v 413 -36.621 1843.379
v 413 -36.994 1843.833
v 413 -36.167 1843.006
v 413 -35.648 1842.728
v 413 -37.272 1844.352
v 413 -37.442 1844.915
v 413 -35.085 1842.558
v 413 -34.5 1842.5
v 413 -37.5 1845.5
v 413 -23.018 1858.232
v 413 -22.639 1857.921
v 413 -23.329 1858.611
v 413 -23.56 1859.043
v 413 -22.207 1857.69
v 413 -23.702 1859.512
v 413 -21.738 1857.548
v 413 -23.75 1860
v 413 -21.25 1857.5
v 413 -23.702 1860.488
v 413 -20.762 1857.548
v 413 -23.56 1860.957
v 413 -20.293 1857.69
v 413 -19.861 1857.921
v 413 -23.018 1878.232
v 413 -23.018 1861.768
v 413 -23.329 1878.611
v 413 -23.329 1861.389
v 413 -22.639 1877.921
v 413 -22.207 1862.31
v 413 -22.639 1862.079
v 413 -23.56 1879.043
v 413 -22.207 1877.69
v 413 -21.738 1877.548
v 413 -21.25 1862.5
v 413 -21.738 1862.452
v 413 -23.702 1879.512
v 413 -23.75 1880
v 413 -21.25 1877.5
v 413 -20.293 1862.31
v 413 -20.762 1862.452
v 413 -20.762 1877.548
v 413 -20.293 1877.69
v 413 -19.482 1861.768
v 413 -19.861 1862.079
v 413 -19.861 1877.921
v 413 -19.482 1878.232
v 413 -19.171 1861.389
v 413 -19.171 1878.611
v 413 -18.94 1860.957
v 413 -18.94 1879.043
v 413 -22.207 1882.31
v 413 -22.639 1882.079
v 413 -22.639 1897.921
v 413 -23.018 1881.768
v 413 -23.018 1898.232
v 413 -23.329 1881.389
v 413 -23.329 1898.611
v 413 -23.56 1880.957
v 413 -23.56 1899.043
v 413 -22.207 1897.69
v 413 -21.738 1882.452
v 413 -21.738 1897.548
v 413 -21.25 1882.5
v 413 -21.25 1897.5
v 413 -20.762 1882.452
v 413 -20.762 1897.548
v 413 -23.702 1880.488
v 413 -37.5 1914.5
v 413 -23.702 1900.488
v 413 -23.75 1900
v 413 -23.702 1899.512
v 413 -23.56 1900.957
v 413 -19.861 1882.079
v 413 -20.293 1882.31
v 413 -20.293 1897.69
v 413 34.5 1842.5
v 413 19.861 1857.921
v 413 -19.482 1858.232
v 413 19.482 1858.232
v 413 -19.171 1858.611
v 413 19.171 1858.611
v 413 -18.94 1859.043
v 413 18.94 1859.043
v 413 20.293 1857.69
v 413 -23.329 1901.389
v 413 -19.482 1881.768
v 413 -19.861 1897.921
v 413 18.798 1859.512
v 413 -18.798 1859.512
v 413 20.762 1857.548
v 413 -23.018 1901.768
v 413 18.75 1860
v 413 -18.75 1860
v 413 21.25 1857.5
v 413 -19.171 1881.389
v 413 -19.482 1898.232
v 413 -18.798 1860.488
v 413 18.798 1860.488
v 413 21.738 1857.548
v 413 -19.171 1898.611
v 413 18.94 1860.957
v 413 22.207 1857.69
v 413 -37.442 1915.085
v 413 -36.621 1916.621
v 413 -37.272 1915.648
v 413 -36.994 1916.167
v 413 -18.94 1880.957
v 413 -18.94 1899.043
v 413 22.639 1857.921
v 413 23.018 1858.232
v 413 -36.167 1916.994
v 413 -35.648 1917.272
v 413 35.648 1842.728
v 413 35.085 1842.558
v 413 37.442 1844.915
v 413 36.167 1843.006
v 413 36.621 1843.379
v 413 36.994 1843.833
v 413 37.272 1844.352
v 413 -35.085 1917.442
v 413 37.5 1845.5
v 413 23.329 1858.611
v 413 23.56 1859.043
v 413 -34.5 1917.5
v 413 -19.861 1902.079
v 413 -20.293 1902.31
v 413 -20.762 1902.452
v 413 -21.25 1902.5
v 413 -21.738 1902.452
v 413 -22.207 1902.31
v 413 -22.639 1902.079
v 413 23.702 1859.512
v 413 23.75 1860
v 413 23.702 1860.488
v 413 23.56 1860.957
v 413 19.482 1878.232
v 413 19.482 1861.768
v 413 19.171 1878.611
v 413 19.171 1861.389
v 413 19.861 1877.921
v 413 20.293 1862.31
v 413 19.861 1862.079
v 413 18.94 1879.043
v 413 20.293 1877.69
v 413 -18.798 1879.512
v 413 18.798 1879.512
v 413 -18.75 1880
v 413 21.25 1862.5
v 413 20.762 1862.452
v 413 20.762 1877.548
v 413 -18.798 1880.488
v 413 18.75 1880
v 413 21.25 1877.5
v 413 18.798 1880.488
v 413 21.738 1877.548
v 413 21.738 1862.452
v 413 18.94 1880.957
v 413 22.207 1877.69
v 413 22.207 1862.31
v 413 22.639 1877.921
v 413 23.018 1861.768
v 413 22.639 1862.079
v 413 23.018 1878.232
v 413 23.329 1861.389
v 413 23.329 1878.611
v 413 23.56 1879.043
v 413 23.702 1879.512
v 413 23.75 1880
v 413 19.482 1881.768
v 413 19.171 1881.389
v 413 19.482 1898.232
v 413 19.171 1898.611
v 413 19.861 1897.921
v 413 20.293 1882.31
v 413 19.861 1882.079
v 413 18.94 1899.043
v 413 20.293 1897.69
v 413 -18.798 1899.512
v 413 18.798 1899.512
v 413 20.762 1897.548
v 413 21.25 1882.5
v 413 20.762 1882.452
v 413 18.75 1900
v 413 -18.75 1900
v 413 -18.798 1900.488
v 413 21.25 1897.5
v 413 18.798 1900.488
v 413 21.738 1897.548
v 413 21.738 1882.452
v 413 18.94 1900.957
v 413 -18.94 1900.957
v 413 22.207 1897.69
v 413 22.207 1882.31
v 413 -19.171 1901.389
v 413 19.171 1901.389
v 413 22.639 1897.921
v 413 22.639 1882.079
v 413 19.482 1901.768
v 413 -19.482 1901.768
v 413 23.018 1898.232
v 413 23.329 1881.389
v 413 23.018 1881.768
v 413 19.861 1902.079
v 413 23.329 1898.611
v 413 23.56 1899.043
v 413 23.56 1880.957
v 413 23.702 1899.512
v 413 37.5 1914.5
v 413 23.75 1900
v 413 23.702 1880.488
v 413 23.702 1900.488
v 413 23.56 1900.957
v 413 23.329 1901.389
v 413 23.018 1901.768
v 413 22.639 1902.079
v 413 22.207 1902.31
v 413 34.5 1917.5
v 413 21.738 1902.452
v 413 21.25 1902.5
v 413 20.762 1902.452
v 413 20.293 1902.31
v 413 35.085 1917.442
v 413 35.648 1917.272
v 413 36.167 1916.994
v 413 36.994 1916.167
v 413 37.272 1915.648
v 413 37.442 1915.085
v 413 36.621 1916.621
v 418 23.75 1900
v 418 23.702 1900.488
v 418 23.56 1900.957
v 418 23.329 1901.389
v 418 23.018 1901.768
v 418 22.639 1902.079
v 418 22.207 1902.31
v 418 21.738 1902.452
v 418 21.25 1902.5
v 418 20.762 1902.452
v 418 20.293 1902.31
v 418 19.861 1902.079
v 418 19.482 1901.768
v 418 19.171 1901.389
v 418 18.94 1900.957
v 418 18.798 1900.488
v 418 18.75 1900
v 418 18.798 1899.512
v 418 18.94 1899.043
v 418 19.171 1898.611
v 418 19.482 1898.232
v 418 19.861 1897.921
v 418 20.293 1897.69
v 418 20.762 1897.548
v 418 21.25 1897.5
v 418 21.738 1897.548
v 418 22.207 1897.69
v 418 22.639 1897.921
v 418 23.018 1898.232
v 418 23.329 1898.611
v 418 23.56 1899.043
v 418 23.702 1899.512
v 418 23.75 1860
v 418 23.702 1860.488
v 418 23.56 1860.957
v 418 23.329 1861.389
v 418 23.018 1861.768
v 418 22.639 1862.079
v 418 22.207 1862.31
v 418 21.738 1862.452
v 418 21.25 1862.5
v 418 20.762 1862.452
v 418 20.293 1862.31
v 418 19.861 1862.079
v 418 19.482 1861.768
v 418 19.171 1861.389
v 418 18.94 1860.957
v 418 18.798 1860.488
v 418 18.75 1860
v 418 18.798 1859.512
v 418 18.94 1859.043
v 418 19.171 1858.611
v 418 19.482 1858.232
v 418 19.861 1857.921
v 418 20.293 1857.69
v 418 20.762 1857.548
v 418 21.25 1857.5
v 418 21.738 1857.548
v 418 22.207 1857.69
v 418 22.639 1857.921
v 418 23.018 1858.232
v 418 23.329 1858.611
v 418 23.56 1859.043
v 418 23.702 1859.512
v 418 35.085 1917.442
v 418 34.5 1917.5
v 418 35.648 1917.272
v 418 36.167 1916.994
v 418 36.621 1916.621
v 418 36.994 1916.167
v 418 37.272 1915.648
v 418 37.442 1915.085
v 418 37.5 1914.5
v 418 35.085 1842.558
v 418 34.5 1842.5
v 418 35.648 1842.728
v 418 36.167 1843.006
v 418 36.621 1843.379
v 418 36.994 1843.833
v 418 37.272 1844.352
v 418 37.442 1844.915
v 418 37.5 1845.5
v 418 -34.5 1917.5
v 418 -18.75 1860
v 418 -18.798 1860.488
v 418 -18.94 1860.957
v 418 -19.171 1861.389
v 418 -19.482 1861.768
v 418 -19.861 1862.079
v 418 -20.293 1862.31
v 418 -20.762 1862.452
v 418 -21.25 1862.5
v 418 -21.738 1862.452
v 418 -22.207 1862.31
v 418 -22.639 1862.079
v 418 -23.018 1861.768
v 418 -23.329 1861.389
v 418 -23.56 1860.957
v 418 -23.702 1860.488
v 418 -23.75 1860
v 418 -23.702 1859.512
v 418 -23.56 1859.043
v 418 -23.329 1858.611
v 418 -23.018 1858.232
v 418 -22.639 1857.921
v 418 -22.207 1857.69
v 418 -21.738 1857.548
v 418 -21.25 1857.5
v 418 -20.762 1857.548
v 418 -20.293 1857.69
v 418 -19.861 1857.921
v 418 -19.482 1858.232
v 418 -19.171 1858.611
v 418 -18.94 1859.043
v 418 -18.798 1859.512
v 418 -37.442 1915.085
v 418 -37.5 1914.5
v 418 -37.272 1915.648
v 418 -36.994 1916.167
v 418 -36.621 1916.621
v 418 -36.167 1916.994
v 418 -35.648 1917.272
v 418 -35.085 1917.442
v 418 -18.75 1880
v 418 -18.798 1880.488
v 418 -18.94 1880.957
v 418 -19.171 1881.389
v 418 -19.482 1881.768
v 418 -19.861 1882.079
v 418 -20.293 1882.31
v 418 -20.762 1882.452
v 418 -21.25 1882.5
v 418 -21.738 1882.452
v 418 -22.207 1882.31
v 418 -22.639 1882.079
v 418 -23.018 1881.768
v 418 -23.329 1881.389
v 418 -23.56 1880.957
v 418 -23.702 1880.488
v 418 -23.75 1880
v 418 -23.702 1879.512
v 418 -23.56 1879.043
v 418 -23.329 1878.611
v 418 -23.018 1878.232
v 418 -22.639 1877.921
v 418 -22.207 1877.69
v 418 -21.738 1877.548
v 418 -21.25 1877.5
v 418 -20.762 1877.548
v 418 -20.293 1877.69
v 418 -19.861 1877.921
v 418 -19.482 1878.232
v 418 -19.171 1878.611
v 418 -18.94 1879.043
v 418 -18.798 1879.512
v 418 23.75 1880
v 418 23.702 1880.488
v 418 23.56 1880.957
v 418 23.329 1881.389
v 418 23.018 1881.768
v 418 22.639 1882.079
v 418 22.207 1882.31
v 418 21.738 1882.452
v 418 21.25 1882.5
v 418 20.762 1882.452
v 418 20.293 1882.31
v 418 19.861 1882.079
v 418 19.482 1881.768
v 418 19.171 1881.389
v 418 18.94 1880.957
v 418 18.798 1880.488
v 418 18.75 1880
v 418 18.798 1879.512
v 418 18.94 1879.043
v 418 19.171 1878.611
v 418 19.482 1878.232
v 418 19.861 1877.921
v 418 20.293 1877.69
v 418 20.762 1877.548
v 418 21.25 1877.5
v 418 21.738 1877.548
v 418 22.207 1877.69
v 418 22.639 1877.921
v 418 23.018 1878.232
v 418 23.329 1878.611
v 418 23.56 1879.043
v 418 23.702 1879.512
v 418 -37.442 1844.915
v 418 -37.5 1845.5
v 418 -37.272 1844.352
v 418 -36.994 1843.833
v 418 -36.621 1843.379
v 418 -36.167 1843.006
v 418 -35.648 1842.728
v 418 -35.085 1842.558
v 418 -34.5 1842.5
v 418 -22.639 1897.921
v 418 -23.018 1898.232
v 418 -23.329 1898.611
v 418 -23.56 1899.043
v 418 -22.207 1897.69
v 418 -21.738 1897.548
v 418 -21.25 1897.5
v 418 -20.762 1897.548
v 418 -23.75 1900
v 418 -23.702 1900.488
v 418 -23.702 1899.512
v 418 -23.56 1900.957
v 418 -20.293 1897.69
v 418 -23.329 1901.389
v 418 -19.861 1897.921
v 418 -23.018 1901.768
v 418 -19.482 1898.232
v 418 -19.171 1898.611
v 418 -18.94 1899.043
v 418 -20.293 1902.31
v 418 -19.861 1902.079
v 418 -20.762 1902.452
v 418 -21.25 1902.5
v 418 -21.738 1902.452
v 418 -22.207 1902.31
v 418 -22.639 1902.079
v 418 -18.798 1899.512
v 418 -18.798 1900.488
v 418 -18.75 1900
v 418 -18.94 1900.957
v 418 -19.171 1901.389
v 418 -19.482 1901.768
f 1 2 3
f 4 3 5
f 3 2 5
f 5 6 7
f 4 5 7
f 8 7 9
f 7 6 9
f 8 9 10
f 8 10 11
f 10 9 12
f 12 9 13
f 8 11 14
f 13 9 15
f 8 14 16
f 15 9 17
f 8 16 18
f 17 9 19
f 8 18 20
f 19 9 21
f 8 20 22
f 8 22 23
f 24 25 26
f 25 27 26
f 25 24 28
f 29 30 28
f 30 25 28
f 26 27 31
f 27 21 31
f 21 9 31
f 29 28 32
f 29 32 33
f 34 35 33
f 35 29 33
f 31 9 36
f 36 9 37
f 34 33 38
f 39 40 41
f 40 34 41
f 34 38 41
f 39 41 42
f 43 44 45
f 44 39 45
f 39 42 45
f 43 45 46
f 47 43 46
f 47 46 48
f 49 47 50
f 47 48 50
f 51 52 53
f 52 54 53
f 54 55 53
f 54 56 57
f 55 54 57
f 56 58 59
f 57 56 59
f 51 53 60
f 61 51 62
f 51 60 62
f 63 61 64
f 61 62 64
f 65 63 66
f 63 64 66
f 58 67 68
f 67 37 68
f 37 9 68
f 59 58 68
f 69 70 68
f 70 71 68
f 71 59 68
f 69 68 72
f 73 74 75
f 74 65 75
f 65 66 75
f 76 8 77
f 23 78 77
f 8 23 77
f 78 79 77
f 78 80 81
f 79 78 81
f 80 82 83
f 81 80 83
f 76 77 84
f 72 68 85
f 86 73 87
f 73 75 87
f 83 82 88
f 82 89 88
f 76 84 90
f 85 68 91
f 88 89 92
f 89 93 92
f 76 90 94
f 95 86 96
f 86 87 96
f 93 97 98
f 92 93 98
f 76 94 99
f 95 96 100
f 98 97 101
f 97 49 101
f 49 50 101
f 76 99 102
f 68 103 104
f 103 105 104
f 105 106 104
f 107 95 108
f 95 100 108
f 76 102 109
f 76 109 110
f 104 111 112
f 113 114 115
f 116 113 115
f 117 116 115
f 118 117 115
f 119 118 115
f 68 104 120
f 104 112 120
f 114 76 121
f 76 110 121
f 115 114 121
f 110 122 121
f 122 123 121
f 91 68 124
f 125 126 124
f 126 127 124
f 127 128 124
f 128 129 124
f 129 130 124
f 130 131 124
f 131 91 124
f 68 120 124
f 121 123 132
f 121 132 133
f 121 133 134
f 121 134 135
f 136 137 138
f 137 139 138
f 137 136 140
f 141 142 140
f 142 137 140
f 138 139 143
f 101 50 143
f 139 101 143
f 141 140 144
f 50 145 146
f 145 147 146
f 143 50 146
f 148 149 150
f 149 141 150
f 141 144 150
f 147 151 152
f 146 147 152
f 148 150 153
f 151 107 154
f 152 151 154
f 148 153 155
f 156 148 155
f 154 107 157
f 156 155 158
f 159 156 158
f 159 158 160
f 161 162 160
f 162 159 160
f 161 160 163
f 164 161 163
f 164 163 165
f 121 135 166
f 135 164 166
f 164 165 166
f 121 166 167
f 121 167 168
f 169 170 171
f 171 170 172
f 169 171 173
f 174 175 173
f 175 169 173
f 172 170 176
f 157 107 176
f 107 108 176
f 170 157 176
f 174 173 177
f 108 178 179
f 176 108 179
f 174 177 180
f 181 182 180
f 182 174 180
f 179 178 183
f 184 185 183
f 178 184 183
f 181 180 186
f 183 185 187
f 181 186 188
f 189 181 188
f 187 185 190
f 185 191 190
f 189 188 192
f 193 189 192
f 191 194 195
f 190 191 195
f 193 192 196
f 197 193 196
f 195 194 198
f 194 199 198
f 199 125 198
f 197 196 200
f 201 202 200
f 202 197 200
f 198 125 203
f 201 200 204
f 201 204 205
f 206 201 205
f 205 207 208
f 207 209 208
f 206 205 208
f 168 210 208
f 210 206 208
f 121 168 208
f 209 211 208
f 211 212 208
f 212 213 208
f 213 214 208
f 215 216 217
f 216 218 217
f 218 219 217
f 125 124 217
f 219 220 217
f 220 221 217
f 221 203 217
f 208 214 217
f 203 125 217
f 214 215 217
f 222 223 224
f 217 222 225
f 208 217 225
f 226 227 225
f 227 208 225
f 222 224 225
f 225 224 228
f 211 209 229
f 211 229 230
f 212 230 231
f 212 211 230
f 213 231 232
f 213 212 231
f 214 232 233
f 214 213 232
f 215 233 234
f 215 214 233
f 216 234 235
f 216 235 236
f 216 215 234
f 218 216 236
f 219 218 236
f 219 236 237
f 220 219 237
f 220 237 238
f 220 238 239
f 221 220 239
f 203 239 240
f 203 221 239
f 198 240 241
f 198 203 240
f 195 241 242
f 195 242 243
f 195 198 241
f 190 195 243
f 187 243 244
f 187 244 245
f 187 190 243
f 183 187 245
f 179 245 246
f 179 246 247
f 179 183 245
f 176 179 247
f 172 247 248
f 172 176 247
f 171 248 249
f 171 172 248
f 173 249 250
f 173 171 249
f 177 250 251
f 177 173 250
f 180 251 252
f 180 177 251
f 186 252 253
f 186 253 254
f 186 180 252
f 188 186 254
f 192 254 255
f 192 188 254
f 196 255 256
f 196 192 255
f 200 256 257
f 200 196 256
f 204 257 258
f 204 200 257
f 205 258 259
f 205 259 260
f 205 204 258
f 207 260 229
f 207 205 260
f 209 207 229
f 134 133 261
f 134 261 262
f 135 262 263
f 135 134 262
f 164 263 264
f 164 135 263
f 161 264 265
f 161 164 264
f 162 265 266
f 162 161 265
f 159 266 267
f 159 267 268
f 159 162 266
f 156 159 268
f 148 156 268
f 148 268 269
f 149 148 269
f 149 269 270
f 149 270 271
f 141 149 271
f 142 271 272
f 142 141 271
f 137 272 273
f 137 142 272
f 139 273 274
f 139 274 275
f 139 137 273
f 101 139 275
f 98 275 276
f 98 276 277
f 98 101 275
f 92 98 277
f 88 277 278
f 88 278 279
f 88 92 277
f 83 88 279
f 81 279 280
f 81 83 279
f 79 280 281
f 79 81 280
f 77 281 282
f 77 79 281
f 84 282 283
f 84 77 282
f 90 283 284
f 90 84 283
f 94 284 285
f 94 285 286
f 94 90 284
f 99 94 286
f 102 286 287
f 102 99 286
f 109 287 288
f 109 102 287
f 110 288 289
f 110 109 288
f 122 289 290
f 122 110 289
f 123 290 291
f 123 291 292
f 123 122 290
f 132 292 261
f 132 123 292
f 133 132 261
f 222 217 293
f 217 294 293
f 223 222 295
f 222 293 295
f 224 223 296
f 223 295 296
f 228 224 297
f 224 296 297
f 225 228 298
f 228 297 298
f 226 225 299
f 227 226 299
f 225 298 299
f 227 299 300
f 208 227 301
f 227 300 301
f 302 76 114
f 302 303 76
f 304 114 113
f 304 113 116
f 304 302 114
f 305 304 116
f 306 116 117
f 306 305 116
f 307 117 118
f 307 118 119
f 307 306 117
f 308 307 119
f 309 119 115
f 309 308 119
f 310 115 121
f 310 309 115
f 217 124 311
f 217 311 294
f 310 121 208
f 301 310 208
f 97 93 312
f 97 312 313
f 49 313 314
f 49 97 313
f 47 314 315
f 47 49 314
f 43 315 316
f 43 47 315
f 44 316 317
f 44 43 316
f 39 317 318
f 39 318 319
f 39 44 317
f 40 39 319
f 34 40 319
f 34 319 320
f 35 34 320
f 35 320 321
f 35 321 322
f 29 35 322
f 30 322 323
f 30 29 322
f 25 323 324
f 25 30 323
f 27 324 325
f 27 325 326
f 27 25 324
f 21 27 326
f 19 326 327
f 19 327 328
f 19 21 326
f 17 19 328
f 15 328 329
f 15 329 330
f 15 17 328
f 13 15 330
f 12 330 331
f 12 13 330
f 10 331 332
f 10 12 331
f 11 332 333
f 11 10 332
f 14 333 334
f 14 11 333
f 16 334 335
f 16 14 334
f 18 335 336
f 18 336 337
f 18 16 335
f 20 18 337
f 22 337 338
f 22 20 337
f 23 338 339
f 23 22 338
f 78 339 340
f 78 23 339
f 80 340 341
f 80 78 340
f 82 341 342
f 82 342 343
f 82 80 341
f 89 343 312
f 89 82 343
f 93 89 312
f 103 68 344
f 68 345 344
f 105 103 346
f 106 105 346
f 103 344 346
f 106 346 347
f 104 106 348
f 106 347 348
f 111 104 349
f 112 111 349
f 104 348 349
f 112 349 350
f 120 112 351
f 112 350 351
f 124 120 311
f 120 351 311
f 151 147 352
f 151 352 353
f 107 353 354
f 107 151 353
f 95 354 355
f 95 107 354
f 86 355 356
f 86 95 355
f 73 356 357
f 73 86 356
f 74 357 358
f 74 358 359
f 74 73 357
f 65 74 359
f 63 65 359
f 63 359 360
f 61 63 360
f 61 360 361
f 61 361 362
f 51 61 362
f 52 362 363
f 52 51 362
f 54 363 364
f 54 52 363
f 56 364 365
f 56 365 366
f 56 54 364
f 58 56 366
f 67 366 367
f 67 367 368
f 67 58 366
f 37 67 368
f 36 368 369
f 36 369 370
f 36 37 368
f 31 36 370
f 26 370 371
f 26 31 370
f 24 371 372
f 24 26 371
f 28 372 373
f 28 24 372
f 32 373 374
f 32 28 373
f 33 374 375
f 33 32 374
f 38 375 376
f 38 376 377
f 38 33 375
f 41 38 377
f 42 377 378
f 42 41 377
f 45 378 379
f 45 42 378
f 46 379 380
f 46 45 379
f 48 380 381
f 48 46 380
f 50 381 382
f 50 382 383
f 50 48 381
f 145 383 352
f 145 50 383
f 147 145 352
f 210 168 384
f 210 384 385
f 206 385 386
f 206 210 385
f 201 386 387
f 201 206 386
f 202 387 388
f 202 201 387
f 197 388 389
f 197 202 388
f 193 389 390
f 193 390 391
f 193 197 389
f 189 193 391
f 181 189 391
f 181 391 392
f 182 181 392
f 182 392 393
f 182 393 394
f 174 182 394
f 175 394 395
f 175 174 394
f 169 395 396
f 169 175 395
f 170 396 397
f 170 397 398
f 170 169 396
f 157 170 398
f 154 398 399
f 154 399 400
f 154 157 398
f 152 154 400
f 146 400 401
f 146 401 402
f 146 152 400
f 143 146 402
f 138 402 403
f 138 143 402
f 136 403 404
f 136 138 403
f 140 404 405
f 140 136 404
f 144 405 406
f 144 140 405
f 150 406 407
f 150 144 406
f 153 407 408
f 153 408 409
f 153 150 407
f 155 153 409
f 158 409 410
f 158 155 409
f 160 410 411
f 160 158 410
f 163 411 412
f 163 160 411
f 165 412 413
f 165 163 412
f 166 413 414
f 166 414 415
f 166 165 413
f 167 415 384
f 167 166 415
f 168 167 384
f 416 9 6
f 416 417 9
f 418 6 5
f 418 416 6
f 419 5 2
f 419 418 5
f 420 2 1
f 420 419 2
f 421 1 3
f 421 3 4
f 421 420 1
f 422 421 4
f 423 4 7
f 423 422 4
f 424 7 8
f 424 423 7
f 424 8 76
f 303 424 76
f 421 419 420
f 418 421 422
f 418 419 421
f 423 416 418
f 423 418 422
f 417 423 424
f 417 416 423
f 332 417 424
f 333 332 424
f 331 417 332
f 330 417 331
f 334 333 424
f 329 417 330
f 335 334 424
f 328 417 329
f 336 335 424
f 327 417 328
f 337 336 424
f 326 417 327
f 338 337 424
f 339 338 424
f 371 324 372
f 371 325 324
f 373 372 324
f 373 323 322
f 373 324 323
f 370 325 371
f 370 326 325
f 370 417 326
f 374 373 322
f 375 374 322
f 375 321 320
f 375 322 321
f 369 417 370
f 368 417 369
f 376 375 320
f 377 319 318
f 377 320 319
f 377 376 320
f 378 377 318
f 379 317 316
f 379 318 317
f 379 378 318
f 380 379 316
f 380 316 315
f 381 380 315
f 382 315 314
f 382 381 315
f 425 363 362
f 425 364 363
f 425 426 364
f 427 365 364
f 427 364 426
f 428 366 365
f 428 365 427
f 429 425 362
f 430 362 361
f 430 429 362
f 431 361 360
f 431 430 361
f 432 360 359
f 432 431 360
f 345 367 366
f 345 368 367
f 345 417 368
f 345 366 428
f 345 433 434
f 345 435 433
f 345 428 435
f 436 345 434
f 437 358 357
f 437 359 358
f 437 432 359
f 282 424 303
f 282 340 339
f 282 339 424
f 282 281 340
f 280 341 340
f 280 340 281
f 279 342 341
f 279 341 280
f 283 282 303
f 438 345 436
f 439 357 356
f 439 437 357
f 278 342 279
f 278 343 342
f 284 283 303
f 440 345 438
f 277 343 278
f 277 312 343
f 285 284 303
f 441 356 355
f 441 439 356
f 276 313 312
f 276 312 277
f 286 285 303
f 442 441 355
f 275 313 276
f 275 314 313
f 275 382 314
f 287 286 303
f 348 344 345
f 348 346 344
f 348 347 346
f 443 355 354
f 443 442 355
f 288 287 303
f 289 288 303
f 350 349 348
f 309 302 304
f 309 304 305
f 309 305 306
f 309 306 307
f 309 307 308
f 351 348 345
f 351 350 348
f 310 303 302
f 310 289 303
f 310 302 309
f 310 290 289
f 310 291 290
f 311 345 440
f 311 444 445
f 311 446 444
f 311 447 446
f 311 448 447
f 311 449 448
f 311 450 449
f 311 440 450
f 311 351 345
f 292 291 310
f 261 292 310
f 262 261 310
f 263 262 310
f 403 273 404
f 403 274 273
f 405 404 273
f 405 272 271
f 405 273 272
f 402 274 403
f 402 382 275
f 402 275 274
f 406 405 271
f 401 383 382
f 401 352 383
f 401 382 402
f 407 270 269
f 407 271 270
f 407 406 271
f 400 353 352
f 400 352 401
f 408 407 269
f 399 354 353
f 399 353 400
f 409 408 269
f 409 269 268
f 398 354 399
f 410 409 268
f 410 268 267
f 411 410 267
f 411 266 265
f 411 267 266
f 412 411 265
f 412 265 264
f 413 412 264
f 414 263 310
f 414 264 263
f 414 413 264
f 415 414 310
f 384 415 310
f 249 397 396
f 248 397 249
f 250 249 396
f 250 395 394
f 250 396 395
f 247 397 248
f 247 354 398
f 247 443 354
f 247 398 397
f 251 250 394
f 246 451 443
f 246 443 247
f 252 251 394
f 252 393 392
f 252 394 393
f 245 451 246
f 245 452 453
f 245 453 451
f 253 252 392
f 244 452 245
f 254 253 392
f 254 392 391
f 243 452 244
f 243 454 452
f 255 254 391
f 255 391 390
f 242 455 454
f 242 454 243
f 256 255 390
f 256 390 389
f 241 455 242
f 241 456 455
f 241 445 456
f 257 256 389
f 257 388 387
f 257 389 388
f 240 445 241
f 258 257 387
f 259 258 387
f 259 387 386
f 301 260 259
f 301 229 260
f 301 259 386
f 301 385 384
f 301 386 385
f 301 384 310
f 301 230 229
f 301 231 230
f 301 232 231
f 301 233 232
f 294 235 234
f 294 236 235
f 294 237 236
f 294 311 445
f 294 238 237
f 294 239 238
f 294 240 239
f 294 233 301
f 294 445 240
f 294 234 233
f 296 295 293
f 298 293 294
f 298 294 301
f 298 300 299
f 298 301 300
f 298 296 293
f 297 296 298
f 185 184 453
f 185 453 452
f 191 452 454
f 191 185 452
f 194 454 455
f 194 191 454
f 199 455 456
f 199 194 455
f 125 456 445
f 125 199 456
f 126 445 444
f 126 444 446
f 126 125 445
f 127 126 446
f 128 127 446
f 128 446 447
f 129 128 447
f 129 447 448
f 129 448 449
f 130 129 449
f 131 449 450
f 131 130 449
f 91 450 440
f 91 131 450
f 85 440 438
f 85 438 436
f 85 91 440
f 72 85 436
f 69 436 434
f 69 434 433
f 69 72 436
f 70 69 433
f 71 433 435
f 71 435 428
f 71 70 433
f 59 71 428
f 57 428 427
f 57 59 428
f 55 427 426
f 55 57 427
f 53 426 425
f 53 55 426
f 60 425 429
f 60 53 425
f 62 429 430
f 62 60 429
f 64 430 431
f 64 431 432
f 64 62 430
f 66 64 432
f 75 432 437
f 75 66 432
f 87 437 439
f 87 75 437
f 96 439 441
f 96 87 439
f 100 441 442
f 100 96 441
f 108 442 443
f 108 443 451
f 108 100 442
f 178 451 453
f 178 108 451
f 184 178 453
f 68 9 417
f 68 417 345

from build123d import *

# Parameters (mm, degrees)
STOCK_MASTER_SKETCH_002_1_START     = 413
STOCK_MASTER_SKETCH_002_1_OUTLINE_W = 75
STOCK_MASTER_SKETCH_002_1_OUTLINE_H = 75
STOCK_MASTER_SKETCH_002_1_OUTLINE_R = 2.5
STOCK_MASTER_SKETCH_002_1_DEPTH     = 5
FILLET1_R                           = 3


# Read off the part's stored shape, not the designer's step: Stock-master_sketch_002-1
with BuildPart() as part:
    # Stock-master_sketch_002-1 outline → Stock-master_sketch_002-1 (new body)
    with BuildSketch(Plane.YZ.offset(STOCK_MASTER_SKETCH_002_1_START)):
        with Locations((0, 1880)):
            Rectangle(STOCK_MASTER_SKETCH_002_1_OUTLINE_W, STOCK_MASTER_SKETCH_002_1_OUTLINE_H)
        with Locations((-21.25, 1860)):
            Circle(STOCK_MASTER_SKETCH_002_1_OUTLINE_R, mode=Mode.SUBTRACT)
        with Locations((21.25, 1860)):
            Circle(STOCK_MASTER_SKETCH_002_1_OUTLINE_R, mode=Mode.SUBTRACT)
        with Locations((-21.25, 1880)):
            Circle(STOCK_MASTER_SKETCH_002_1_OUTLINE_R, mode=Mode.SUBTRACT)
        with Locations((-21.25, 1900)):
            Circle(STOCK_MASTER_SKETCH_002_1_OUTLINE_R, mode=Mode.SUBTRACT)
        with Locations((21.25, 1880)):
            Circle(STOCK_MASTER_SKETCH_002_1_OUTLINE_R, mode=Mode.SUBTRACT)
        with Locations((21.25, 1900)):
            Circle(STOCK_MASTER_SKETCH_002_1_OUTLINE_R, mode=Mode.SUBTRACT)
    extrude(amount=STOCK_MASTER_SKETCH_002_1_DEPTH)

    # Fillet1
    fillet1_edges = [part.edges().sort_by_distance(p)[0] for p in [
        (415.5, 37.5, 1917.5),
        (415.5, 37.5, 1842.5),
        (415.5, -37.5, 1842.5),
        (415.5, -37.5, 1917.5),
    ]]
    fillet(fillet1_edges, radius=FILLET1_R)


solid = part.part
